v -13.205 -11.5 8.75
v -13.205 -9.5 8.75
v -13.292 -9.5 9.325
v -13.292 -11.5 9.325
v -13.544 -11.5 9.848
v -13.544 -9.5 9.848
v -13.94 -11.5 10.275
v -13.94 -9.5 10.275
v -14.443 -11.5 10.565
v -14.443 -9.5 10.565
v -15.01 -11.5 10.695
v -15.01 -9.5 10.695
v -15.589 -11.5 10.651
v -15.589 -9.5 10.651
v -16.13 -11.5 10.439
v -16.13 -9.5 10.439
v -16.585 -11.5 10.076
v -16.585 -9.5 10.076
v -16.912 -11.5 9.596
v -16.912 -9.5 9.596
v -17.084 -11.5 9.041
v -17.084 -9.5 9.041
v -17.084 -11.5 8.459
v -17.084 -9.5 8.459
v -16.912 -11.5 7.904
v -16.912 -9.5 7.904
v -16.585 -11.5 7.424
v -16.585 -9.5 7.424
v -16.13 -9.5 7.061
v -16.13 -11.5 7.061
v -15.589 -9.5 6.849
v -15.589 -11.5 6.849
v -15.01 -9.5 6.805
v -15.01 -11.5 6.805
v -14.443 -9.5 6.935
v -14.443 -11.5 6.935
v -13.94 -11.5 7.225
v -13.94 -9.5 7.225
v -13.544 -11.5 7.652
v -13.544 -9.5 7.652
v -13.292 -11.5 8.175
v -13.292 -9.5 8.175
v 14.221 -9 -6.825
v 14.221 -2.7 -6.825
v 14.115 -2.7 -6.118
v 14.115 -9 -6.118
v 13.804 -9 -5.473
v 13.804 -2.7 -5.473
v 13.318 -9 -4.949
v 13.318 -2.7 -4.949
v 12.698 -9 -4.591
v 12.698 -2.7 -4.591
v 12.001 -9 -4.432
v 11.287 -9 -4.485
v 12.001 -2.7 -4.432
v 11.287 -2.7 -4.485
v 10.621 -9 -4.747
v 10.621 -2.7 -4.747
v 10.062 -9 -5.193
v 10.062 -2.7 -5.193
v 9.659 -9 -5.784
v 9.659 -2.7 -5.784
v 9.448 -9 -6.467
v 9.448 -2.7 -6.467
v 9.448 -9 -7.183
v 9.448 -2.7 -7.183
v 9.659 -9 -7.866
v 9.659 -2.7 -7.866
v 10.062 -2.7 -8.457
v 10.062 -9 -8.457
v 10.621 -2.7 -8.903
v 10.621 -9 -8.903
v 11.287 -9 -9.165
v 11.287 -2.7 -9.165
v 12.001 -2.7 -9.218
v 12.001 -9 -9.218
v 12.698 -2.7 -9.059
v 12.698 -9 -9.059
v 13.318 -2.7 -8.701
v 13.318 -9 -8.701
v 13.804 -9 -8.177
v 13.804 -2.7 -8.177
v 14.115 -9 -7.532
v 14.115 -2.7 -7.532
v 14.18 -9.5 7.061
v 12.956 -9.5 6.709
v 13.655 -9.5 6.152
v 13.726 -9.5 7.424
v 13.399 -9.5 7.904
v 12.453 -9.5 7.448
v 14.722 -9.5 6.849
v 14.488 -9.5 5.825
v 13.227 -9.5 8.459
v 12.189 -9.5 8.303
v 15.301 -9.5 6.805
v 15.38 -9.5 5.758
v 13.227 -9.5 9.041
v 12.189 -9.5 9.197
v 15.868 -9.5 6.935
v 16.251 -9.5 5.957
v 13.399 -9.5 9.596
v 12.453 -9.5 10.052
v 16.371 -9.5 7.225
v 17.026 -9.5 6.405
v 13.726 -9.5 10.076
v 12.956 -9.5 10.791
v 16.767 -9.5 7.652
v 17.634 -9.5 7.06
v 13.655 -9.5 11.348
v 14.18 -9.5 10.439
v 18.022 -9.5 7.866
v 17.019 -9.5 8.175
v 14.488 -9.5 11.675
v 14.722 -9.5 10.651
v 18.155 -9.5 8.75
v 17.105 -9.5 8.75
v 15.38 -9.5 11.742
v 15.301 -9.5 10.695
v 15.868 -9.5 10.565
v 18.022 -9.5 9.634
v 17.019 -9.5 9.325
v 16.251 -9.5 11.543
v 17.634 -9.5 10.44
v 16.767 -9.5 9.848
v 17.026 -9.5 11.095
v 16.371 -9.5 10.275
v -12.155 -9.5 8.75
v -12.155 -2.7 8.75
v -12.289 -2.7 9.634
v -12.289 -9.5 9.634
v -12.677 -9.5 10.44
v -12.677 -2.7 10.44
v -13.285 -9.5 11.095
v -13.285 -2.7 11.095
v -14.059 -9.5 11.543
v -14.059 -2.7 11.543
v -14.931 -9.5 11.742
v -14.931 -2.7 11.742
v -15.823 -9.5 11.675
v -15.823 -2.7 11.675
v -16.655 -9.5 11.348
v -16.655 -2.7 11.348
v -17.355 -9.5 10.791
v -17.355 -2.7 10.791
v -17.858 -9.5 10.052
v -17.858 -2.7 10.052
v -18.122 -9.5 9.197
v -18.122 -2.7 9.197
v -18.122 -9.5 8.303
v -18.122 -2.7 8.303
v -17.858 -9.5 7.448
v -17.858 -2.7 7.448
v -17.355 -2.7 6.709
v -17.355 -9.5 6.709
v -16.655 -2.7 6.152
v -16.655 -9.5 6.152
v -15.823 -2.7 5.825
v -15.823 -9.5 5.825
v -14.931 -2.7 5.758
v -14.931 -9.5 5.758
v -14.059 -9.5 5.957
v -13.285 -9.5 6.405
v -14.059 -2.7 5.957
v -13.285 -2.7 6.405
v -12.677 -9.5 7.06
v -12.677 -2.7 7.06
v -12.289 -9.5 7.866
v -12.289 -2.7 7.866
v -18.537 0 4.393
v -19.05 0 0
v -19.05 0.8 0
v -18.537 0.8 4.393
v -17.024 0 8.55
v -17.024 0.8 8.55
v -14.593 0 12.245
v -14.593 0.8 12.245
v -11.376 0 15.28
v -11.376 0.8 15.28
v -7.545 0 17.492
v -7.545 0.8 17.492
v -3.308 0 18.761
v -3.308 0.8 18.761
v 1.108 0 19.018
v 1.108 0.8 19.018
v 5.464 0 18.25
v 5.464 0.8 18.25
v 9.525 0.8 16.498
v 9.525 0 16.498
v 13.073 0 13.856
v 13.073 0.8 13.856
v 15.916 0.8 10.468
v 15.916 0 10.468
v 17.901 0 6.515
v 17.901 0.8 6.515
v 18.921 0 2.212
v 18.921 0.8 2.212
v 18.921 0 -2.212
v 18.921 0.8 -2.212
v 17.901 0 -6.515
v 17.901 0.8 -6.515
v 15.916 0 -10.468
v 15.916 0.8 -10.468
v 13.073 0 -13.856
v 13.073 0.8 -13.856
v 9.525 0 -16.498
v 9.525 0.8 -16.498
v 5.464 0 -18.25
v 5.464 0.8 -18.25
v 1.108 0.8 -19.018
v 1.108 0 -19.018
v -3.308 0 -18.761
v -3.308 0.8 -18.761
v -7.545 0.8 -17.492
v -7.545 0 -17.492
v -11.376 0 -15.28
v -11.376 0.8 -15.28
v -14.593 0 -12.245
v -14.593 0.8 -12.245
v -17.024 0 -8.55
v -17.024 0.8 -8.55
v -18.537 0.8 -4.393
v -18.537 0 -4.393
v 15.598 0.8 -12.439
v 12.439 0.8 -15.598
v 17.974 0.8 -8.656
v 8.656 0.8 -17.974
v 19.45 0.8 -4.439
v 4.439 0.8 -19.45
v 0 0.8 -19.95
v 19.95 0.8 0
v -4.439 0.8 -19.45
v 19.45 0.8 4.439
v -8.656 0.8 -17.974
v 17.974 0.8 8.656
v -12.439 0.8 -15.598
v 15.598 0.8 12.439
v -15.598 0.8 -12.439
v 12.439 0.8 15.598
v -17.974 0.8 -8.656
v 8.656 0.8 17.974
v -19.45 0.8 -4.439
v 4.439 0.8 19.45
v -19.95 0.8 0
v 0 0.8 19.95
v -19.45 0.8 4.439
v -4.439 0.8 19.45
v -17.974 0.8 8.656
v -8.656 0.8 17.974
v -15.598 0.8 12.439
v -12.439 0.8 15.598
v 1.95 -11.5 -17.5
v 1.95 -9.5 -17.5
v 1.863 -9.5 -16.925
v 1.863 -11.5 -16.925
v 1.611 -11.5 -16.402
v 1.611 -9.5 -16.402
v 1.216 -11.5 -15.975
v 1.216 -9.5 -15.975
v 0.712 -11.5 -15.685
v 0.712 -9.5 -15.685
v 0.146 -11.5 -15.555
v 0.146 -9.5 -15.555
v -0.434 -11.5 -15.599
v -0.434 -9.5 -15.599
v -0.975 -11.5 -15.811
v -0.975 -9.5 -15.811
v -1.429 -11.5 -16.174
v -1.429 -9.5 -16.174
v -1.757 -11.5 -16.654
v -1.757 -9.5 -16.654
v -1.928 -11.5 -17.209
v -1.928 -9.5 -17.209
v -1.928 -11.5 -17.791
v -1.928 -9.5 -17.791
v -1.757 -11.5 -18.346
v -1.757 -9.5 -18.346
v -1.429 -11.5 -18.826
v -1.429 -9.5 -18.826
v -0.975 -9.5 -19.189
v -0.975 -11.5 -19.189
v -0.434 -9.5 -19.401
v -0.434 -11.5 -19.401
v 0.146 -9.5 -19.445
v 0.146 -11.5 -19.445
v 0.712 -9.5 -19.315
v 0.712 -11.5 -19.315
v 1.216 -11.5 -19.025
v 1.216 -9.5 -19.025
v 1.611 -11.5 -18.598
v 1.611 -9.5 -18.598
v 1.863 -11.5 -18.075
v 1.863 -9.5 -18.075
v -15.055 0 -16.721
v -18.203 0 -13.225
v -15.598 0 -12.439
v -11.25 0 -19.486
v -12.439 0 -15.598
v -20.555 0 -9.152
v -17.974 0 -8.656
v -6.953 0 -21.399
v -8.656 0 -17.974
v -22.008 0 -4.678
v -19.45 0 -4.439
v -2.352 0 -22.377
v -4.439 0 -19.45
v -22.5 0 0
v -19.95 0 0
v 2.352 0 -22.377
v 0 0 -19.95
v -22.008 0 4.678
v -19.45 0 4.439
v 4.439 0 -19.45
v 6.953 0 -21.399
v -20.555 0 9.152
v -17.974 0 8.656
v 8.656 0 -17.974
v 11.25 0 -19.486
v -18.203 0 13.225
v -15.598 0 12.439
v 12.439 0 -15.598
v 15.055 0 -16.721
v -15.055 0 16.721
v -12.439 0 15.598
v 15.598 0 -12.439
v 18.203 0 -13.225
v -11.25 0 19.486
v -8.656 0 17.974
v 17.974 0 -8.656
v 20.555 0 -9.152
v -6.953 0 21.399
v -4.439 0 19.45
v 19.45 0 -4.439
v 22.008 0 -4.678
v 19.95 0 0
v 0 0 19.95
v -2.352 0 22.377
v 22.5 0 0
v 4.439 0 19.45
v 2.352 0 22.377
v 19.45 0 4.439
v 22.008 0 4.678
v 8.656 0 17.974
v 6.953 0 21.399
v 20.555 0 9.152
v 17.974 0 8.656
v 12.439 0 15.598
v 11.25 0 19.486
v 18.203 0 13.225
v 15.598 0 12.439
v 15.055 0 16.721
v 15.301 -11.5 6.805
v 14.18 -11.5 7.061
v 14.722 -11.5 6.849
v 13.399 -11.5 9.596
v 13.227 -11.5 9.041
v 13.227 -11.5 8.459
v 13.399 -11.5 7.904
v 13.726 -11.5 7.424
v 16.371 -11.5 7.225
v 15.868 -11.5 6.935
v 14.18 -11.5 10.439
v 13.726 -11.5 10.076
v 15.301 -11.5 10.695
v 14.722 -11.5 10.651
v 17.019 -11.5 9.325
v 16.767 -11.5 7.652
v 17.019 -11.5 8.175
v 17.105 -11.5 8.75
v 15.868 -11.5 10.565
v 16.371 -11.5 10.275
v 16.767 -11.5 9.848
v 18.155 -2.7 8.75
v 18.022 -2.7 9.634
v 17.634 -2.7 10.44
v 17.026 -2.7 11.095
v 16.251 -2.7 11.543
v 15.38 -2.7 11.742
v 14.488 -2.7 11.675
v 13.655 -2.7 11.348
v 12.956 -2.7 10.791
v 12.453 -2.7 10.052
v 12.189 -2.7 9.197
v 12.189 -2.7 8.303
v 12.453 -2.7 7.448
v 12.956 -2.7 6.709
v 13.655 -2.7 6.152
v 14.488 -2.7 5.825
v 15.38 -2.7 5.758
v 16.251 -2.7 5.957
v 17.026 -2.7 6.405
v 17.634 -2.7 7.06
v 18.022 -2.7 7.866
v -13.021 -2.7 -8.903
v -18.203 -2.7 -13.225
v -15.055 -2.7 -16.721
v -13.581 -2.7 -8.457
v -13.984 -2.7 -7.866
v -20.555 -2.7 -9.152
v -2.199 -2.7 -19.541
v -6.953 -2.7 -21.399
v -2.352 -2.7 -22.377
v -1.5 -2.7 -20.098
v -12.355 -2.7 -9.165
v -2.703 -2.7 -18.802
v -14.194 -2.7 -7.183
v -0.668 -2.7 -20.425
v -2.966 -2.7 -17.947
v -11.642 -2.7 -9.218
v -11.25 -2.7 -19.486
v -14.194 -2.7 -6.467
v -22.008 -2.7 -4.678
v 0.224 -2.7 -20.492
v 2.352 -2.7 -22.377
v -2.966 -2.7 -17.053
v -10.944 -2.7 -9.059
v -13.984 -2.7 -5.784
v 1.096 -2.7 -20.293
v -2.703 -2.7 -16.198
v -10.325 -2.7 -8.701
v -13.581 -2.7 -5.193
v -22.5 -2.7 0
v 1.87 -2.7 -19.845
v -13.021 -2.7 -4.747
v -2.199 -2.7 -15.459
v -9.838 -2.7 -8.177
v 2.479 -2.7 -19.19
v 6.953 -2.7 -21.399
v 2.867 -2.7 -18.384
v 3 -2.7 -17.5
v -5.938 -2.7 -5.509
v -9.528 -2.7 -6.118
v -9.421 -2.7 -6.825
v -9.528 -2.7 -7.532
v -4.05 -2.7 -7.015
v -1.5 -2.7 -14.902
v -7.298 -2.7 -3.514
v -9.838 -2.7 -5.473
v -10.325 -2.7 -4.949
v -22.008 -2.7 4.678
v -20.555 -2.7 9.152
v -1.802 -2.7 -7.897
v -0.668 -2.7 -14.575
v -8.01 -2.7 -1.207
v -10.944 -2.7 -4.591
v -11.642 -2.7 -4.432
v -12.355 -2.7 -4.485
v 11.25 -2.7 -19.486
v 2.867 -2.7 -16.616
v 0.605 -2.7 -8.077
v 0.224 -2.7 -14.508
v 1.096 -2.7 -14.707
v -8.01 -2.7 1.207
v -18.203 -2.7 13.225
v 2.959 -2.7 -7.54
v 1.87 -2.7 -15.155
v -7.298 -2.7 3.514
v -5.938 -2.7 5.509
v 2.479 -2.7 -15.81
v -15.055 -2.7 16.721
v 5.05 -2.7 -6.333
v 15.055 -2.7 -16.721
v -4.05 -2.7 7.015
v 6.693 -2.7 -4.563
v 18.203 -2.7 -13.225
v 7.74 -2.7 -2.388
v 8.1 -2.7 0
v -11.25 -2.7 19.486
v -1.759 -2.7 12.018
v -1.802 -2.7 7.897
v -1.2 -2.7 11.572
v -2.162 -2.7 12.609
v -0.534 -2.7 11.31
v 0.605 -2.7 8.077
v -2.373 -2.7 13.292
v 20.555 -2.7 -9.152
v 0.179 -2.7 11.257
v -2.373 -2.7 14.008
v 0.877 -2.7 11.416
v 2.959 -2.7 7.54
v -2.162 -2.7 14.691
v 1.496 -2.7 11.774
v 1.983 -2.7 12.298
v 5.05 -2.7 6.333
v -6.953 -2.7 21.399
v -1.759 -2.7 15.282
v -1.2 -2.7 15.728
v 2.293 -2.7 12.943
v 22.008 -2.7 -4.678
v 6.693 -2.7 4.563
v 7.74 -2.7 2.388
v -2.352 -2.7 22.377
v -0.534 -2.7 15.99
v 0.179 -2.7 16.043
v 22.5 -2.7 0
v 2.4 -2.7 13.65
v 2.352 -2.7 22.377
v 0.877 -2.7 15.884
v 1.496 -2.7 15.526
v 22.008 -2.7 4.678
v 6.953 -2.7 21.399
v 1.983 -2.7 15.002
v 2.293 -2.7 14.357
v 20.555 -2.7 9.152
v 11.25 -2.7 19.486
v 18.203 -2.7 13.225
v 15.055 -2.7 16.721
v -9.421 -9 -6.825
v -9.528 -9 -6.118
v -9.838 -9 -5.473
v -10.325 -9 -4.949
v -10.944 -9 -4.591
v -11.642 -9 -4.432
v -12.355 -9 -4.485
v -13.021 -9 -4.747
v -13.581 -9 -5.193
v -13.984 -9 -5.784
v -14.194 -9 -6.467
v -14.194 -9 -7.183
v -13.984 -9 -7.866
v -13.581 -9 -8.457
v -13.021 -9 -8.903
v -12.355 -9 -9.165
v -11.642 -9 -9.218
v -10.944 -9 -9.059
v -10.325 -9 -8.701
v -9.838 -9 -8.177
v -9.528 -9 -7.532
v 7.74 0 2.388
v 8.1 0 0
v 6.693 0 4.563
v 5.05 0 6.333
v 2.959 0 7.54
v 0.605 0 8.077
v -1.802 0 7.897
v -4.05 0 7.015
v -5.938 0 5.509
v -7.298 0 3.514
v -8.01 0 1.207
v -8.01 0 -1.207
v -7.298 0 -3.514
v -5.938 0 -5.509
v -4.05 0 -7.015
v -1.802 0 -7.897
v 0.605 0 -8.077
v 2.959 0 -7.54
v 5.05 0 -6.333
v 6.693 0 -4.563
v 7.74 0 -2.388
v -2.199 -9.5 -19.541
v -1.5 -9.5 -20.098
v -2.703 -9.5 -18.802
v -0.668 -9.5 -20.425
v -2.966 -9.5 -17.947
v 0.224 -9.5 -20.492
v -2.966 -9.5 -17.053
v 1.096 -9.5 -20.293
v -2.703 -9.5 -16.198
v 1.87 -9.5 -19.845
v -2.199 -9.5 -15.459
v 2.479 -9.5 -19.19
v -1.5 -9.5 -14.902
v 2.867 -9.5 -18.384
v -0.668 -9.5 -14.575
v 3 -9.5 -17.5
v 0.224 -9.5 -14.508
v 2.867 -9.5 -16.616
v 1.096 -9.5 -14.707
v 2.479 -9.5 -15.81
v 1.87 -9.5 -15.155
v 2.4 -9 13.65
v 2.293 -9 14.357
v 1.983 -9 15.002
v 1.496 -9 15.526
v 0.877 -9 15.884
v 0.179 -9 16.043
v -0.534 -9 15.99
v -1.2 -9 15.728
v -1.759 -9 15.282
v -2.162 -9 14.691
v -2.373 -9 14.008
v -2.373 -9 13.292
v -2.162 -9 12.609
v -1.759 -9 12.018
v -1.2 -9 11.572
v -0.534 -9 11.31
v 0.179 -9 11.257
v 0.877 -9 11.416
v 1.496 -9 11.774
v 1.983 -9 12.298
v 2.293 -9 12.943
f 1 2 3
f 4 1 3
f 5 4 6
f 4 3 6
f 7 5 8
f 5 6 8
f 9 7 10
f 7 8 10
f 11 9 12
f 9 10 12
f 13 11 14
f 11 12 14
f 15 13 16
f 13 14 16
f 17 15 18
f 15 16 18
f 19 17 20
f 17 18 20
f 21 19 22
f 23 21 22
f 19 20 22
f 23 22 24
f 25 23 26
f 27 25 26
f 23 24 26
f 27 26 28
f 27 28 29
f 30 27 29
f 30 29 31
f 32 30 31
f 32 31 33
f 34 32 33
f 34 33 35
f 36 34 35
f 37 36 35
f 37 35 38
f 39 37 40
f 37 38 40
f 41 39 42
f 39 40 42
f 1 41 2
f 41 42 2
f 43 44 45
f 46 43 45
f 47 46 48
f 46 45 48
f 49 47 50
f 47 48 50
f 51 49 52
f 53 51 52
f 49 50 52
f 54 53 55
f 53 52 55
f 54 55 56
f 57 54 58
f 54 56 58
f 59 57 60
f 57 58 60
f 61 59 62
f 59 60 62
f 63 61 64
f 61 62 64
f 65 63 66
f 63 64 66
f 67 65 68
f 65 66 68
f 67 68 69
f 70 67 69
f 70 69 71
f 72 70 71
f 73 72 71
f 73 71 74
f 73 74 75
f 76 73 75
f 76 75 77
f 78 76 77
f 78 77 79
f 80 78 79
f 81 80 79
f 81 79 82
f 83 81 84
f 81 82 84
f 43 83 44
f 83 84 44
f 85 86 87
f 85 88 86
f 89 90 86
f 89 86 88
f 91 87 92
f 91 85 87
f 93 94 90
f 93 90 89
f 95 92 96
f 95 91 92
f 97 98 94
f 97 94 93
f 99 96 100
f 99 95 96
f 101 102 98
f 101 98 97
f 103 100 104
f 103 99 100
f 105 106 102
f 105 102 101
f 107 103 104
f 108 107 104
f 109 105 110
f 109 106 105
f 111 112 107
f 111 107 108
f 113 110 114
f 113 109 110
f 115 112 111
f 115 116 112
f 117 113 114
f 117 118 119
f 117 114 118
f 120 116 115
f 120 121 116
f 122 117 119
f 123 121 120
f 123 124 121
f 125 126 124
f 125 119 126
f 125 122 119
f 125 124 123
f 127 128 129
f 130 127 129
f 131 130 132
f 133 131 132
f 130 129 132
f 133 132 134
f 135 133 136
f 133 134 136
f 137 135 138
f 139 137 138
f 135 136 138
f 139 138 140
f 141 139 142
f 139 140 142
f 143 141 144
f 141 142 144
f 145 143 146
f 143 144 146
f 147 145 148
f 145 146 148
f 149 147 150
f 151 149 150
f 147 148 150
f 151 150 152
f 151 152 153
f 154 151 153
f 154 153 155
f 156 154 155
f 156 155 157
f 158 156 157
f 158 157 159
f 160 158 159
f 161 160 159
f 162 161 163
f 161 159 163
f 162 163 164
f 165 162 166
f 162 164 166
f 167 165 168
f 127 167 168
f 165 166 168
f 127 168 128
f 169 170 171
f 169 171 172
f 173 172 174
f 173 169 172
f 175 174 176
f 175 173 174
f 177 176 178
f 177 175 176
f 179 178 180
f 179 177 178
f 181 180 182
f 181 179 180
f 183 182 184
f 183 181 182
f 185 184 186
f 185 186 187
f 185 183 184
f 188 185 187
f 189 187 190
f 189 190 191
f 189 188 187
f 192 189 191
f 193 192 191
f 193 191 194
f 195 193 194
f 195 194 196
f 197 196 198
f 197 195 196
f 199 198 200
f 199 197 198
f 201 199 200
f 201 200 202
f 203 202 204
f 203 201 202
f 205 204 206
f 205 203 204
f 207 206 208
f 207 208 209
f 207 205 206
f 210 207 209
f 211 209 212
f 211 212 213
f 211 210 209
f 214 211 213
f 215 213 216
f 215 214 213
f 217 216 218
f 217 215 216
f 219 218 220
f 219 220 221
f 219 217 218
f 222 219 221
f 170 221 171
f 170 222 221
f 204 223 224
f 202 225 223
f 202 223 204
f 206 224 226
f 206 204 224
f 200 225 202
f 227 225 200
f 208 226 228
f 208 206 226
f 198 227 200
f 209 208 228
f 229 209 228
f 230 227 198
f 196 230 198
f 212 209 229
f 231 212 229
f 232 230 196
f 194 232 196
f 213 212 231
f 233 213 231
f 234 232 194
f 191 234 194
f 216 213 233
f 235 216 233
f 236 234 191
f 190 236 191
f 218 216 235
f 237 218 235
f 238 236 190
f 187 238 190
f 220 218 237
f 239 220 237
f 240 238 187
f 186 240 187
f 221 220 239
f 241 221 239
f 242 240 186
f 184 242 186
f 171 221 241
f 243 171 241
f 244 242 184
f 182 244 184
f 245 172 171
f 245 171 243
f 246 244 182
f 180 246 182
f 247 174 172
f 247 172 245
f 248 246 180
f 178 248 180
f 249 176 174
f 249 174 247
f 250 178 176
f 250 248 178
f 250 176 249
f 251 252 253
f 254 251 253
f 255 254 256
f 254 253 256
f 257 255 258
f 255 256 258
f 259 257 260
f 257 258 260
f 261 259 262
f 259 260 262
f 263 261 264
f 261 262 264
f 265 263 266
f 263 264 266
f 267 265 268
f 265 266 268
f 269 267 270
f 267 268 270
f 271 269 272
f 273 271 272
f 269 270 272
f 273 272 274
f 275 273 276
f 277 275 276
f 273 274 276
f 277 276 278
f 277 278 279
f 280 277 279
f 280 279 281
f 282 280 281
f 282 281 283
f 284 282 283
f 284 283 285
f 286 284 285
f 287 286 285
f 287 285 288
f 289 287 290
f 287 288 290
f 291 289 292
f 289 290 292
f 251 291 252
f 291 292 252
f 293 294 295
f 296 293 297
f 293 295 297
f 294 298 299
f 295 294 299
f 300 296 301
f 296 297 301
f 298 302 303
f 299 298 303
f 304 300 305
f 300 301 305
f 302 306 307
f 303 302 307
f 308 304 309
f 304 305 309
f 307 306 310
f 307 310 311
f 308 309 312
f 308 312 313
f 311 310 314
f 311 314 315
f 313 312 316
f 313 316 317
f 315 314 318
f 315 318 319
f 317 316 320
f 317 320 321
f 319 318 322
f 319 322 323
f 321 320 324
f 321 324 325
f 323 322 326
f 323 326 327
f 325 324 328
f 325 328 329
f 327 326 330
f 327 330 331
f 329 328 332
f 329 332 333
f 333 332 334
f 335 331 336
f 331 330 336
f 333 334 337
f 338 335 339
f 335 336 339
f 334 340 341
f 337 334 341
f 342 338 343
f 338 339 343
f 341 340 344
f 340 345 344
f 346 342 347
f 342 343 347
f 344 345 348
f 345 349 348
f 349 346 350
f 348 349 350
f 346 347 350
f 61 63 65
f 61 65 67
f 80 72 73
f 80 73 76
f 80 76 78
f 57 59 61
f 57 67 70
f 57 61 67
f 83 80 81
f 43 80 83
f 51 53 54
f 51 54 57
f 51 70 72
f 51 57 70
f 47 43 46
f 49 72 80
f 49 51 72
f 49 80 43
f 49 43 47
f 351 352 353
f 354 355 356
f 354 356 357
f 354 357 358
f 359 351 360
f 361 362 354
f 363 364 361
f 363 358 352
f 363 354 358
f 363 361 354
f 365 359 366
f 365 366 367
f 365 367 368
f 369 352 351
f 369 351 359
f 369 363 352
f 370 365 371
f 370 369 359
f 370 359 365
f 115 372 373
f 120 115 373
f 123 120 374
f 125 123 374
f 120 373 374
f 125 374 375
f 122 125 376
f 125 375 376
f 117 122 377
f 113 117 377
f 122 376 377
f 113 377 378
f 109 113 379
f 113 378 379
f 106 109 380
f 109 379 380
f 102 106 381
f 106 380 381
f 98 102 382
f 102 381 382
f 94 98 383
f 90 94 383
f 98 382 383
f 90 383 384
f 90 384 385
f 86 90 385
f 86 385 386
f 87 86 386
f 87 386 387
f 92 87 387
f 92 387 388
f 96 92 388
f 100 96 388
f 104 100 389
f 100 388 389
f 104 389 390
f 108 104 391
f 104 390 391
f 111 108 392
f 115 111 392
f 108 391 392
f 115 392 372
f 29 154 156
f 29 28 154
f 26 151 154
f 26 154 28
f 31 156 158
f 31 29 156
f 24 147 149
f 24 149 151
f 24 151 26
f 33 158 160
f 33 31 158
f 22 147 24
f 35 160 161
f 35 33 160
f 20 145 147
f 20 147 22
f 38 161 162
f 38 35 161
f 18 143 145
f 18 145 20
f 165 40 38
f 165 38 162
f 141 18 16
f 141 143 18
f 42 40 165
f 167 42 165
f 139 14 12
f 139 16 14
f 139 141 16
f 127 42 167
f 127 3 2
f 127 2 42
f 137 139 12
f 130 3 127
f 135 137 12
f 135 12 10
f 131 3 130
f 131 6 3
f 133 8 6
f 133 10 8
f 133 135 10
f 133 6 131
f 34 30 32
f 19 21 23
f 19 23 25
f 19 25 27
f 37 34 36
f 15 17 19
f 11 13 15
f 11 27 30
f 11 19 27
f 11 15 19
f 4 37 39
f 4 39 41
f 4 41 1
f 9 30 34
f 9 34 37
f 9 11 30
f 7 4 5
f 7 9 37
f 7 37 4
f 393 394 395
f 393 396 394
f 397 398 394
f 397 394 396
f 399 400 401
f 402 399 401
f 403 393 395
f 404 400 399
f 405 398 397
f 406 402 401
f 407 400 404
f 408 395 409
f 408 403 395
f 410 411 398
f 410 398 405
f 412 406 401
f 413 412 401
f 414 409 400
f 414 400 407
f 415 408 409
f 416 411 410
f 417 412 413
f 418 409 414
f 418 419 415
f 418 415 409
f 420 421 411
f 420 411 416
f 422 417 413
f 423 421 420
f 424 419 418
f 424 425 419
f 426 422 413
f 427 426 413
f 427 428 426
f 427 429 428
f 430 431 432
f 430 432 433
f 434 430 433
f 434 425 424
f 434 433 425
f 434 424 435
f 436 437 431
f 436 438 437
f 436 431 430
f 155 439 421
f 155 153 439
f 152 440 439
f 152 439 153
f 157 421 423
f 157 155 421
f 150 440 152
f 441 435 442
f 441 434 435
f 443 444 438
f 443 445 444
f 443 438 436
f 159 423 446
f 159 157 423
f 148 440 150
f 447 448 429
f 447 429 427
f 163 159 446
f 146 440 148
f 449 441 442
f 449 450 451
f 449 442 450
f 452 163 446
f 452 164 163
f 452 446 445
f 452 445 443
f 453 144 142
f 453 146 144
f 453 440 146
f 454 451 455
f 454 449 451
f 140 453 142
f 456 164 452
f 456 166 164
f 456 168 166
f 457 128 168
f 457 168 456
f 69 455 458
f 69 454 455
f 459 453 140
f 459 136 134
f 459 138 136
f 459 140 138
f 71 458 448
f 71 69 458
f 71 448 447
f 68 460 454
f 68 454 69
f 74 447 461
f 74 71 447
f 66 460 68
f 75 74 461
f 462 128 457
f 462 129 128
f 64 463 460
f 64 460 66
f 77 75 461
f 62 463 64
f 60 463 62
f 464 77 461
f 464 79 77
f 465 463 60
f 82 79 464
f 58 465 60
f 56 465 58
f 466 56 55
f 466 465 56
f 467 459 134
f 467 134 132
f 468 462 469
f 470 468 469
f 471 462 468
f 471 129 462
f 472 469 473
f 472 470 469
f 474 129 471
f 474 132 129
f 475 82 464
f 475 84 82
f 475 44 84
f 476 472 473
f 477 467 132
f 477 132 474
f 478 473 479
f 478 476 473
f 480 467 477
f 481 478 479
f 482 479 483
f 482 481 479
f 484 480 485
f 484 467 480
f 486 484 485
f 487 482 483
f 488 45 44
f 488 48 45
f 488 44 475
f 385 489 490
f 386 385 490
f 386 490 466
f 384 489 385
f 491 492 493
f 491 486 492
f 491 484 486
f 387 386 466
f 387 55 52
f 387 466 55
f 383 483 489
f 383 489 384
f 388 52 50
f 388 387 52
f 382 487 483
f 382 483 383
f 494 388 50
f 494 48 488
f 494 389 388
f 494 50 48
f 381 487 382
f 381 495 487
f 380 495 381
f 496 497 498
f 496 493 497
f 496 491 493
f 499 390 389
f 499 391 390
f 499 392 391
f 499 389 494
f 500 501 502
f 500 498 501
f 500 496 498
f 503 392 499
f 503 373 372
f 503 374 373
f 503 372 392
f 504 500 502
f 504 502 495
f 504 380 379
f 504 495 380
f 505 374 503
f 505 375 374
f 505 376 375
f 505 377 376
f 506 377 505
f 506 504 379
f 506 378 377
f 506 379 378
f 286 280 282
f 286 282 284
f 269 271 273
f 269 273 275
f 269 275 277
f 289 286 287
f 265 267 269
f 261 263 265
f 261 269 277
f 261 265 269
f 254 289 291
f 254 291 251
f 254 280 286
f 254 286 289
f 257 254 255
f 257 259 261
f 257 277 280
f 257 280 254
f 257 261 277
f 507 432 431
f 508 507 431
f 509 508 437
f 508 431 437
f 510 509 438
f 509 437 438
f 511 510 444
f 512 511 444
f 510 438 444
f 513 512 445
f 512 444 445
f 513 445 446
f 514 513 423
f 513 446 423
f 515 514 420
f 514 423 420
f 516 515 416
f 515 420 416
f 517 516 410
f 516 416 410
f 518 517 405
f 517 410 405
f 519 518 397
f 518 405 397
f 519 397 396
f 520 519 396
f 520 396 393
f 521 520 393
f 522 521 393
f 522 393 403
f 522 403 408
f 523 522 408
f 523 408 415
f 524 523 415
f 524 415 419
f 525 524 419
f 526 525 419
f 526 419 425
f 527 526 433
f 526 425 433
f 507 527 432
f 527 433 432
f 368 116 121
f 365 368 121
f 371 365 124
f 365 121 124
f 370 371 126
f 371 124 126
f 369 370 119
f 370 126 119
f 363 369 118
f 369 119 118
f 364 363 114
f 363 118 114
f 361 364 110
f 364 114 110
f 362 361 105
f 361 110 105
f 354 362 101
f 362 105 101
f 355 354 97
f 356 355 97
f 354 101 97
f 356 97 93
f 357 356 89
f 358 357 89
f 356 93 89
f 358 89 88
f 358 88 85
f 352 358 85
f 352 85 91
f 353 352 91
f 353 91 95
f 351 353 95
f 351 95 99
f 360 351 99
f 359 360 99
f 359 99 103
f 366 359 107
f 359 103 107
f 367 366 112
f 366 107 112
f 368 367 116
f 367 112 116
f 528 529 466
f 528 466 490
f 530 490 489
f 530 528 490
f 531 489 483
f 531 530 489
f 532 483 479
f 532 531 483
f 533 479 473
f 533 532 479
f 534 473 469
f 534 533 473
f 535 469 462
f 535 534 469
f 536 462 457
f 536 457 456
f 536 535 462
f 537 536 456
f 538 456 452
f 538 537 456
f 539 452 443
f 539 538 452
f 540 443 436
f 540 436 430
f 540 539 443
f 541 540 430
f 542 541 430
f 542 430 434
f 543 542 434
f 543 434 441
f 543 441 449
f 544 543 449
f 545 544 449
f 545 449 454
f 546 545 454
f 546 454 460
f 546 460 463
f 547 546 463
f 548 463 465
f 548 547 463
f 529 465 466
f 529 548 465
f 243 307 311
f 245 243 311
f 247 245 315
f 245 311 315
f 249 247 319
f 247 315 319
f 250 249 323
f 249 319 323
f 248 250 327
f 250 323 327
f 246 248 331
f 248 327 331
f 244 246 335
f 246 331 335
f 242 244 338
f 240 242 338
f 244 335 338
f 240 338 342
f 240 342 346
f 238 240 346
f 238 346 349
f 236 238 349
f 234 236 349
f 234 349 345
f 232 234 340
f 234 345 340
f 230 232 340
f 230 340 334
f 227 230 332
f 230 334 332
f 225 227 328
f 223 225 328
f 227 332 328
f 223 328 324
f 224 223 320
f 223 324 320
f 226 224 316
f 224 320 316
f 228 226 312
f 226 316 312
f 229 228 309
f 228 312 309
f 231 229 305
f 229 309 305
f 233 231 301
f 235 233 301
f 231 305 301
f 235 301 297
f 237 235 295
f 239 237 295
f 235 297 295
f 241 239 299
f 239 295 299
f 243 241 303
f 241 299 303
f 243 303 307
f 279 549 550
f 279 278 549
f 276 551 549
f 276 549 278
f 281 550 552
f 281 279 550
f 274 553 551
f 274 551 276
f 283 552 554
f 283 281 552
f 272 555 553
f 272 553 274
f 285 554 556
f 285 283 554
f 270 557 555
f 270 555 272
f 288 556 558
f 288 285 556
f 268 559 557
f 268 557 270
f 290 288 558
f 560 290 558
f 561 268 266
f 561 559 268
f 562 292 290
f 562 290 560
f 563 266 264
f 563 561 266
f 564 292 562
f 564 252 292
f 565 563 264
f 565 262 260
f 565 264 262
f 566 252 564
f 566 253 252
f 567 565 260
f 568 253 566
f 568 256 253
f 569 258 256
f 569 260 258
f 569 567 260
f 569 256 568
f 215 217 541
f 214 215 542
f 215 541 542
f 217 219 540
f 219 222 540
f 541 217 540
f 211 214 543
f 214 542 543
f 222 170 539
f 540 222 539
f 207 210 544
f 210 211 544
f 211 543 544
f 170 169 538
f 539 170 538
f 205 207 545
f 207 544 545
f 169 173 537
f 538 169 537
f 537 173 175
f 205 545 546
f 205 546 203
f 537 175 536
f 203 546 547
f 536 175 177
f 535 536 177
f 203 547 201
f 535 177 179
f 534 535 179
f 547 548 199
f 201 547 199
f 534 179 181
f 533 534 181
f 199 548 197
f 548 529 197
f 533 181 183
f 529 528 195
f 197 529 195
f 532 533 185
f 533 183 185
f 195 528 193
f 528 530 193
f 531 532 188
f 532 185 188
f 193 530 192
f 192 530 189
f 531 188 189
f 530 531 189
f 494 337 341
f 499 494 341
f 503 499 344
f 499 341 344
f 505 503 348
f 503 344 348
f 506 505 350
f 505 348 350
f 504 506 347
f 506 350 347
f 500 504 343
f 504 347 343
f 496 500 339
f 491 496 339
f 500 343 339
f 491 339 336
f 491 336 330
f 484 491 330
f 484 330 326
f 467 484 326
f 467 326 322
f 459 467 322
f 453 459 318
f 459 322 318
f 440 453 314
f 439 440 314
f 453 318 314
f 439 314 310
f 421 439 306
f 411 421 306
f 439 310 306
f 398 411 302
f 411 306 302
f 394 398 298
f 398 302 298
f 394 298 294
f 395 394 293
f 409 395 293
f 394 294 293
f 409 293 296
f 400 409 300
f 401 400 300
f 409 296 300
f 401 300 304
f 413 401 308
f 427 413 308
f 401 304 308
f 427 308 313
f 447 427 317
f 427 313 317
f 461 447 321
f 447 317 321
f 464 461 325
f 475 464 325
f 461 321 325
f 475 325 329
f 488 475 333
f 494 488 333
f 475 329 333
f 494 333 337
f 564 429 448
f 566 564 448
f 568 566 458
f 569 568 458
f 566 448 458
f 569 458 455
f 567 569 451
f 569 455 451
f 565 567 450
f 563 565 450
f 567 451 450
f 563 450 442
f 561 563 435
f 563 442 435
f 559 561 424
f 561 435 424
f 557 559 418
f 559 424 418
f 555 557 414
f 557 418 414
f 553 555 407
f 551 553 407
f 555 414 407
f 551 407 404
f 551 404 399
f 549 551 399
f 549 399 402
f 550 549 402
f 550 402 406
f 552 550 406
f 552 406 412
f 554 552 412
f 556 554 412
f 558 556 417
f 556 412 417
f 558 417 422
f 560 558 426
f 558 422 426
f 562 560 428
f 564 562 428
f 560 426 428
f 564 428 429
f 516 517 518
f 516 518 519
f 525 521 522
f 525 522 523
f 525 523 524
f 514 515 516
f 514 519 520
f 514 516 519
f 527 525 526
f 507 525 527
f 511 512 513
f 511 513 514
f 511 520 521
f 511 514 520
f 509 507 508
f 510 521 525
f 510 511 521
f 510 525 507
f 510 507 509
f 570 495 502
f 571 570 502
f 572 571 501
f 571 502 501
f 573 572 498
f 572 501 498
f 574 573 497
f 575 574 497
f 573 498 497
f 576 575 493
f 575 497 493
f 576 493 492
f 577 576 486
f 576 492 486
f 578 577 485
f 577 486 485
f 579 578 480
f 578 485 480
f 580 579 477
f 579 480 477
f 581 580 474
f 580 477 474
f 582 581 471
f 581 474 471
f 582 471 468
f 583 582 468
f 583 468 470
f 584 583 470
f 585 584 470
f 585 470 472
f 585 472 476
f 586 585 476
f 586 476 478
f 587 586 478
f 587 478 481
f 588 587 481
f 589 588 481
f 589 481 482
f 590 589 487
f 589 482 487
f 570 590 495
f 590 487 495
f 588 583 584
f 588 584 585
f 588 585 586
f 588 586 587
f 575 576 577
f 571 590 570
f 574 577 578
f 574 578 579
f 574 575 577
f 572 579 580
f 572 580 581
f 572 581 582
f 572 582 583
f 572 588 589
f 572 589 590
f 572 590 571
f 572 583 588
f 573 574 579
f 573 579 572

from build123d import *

# Parameters (mm, degrees)
F0_R      = 22.5
F0_R_2    = 8.1
F1_DEPTH  = 2.7
F2_R      = 2.4
F3_DEPTH  = 6.3
F4_R      = 3
F5_DEPTH  = 6.8
F6_R      = 1.95
F7_R      = 1.95
F8_R      = 1.95
F9_DEPTH  = 2
F10_R     = 19.95
F10_R_2   = 19.05
F11_DEPTH = 0.8


with BuildPart() as f1:
    # F0 (on Front) → F1 (new body)
    with BuildSketch(Plane.XZ):
        Circle(F0_R)
        Circle(F0_R_2, mode=Mode.SUBTRACT)
    extrude(amount=F1_DEPTH)

    # F2 (on face) → F3 (join)
    with BuildSketch(Plane.XZ.offset(2.7)):
        with Locations((0, 13.65)):
            Circle(F2_R)
        with Locations((-11.821247, -6.825)):
            Circle(F2_R)
        with Locations((11.821247, -6.825)):
            Circle(F2_R)
    extrude(amount=F3_DEPTH)

    # F4 (on face) → F5 (join)
    with BuildSketch(Plane.XZ.offset(2.7)):
        with Locations((0, -17.5)):
            Circle(F4_R)
        with Locations((15.155445, 8.75)):
            Circle(F4_R)
        with Locations((-15.155445, 8.75)):
            Circle(F4_R)
    extrude(amount=F5_DEPTH)

    # F6 (on face) + F7 (on face) + F8 (on face) → F9 (join)
    with BuildSketch(Plane.XZ.offset(9.5)):
        with Locations((0, -17.5)):
            Circle(F6_R)
    with BuildSketch(Plane.XZ.offset(9.5)):
        with Locations((-15.155445, 8.75)):
            Circle(F7_R)
    with BuildSketch(Plane.XZ.offset(9.5)):
        with Locations((15.155445, 8.75)):
            Circle(F8_R)
    extrude(amount=F9_DEPTH)

    # F10 (on face) → F11 (join)
    with BuildSketch(Plane(origin=(0, 0, 0), x_dir=(-1, 0, 0), z_dir=(0, 1, 0))):
        Circle(F10_R)
        Circle(F10_R_2, mode=Mode.SUBTRACT)
    extrude(amount=F11_DEPTH)


solid = f1.part
